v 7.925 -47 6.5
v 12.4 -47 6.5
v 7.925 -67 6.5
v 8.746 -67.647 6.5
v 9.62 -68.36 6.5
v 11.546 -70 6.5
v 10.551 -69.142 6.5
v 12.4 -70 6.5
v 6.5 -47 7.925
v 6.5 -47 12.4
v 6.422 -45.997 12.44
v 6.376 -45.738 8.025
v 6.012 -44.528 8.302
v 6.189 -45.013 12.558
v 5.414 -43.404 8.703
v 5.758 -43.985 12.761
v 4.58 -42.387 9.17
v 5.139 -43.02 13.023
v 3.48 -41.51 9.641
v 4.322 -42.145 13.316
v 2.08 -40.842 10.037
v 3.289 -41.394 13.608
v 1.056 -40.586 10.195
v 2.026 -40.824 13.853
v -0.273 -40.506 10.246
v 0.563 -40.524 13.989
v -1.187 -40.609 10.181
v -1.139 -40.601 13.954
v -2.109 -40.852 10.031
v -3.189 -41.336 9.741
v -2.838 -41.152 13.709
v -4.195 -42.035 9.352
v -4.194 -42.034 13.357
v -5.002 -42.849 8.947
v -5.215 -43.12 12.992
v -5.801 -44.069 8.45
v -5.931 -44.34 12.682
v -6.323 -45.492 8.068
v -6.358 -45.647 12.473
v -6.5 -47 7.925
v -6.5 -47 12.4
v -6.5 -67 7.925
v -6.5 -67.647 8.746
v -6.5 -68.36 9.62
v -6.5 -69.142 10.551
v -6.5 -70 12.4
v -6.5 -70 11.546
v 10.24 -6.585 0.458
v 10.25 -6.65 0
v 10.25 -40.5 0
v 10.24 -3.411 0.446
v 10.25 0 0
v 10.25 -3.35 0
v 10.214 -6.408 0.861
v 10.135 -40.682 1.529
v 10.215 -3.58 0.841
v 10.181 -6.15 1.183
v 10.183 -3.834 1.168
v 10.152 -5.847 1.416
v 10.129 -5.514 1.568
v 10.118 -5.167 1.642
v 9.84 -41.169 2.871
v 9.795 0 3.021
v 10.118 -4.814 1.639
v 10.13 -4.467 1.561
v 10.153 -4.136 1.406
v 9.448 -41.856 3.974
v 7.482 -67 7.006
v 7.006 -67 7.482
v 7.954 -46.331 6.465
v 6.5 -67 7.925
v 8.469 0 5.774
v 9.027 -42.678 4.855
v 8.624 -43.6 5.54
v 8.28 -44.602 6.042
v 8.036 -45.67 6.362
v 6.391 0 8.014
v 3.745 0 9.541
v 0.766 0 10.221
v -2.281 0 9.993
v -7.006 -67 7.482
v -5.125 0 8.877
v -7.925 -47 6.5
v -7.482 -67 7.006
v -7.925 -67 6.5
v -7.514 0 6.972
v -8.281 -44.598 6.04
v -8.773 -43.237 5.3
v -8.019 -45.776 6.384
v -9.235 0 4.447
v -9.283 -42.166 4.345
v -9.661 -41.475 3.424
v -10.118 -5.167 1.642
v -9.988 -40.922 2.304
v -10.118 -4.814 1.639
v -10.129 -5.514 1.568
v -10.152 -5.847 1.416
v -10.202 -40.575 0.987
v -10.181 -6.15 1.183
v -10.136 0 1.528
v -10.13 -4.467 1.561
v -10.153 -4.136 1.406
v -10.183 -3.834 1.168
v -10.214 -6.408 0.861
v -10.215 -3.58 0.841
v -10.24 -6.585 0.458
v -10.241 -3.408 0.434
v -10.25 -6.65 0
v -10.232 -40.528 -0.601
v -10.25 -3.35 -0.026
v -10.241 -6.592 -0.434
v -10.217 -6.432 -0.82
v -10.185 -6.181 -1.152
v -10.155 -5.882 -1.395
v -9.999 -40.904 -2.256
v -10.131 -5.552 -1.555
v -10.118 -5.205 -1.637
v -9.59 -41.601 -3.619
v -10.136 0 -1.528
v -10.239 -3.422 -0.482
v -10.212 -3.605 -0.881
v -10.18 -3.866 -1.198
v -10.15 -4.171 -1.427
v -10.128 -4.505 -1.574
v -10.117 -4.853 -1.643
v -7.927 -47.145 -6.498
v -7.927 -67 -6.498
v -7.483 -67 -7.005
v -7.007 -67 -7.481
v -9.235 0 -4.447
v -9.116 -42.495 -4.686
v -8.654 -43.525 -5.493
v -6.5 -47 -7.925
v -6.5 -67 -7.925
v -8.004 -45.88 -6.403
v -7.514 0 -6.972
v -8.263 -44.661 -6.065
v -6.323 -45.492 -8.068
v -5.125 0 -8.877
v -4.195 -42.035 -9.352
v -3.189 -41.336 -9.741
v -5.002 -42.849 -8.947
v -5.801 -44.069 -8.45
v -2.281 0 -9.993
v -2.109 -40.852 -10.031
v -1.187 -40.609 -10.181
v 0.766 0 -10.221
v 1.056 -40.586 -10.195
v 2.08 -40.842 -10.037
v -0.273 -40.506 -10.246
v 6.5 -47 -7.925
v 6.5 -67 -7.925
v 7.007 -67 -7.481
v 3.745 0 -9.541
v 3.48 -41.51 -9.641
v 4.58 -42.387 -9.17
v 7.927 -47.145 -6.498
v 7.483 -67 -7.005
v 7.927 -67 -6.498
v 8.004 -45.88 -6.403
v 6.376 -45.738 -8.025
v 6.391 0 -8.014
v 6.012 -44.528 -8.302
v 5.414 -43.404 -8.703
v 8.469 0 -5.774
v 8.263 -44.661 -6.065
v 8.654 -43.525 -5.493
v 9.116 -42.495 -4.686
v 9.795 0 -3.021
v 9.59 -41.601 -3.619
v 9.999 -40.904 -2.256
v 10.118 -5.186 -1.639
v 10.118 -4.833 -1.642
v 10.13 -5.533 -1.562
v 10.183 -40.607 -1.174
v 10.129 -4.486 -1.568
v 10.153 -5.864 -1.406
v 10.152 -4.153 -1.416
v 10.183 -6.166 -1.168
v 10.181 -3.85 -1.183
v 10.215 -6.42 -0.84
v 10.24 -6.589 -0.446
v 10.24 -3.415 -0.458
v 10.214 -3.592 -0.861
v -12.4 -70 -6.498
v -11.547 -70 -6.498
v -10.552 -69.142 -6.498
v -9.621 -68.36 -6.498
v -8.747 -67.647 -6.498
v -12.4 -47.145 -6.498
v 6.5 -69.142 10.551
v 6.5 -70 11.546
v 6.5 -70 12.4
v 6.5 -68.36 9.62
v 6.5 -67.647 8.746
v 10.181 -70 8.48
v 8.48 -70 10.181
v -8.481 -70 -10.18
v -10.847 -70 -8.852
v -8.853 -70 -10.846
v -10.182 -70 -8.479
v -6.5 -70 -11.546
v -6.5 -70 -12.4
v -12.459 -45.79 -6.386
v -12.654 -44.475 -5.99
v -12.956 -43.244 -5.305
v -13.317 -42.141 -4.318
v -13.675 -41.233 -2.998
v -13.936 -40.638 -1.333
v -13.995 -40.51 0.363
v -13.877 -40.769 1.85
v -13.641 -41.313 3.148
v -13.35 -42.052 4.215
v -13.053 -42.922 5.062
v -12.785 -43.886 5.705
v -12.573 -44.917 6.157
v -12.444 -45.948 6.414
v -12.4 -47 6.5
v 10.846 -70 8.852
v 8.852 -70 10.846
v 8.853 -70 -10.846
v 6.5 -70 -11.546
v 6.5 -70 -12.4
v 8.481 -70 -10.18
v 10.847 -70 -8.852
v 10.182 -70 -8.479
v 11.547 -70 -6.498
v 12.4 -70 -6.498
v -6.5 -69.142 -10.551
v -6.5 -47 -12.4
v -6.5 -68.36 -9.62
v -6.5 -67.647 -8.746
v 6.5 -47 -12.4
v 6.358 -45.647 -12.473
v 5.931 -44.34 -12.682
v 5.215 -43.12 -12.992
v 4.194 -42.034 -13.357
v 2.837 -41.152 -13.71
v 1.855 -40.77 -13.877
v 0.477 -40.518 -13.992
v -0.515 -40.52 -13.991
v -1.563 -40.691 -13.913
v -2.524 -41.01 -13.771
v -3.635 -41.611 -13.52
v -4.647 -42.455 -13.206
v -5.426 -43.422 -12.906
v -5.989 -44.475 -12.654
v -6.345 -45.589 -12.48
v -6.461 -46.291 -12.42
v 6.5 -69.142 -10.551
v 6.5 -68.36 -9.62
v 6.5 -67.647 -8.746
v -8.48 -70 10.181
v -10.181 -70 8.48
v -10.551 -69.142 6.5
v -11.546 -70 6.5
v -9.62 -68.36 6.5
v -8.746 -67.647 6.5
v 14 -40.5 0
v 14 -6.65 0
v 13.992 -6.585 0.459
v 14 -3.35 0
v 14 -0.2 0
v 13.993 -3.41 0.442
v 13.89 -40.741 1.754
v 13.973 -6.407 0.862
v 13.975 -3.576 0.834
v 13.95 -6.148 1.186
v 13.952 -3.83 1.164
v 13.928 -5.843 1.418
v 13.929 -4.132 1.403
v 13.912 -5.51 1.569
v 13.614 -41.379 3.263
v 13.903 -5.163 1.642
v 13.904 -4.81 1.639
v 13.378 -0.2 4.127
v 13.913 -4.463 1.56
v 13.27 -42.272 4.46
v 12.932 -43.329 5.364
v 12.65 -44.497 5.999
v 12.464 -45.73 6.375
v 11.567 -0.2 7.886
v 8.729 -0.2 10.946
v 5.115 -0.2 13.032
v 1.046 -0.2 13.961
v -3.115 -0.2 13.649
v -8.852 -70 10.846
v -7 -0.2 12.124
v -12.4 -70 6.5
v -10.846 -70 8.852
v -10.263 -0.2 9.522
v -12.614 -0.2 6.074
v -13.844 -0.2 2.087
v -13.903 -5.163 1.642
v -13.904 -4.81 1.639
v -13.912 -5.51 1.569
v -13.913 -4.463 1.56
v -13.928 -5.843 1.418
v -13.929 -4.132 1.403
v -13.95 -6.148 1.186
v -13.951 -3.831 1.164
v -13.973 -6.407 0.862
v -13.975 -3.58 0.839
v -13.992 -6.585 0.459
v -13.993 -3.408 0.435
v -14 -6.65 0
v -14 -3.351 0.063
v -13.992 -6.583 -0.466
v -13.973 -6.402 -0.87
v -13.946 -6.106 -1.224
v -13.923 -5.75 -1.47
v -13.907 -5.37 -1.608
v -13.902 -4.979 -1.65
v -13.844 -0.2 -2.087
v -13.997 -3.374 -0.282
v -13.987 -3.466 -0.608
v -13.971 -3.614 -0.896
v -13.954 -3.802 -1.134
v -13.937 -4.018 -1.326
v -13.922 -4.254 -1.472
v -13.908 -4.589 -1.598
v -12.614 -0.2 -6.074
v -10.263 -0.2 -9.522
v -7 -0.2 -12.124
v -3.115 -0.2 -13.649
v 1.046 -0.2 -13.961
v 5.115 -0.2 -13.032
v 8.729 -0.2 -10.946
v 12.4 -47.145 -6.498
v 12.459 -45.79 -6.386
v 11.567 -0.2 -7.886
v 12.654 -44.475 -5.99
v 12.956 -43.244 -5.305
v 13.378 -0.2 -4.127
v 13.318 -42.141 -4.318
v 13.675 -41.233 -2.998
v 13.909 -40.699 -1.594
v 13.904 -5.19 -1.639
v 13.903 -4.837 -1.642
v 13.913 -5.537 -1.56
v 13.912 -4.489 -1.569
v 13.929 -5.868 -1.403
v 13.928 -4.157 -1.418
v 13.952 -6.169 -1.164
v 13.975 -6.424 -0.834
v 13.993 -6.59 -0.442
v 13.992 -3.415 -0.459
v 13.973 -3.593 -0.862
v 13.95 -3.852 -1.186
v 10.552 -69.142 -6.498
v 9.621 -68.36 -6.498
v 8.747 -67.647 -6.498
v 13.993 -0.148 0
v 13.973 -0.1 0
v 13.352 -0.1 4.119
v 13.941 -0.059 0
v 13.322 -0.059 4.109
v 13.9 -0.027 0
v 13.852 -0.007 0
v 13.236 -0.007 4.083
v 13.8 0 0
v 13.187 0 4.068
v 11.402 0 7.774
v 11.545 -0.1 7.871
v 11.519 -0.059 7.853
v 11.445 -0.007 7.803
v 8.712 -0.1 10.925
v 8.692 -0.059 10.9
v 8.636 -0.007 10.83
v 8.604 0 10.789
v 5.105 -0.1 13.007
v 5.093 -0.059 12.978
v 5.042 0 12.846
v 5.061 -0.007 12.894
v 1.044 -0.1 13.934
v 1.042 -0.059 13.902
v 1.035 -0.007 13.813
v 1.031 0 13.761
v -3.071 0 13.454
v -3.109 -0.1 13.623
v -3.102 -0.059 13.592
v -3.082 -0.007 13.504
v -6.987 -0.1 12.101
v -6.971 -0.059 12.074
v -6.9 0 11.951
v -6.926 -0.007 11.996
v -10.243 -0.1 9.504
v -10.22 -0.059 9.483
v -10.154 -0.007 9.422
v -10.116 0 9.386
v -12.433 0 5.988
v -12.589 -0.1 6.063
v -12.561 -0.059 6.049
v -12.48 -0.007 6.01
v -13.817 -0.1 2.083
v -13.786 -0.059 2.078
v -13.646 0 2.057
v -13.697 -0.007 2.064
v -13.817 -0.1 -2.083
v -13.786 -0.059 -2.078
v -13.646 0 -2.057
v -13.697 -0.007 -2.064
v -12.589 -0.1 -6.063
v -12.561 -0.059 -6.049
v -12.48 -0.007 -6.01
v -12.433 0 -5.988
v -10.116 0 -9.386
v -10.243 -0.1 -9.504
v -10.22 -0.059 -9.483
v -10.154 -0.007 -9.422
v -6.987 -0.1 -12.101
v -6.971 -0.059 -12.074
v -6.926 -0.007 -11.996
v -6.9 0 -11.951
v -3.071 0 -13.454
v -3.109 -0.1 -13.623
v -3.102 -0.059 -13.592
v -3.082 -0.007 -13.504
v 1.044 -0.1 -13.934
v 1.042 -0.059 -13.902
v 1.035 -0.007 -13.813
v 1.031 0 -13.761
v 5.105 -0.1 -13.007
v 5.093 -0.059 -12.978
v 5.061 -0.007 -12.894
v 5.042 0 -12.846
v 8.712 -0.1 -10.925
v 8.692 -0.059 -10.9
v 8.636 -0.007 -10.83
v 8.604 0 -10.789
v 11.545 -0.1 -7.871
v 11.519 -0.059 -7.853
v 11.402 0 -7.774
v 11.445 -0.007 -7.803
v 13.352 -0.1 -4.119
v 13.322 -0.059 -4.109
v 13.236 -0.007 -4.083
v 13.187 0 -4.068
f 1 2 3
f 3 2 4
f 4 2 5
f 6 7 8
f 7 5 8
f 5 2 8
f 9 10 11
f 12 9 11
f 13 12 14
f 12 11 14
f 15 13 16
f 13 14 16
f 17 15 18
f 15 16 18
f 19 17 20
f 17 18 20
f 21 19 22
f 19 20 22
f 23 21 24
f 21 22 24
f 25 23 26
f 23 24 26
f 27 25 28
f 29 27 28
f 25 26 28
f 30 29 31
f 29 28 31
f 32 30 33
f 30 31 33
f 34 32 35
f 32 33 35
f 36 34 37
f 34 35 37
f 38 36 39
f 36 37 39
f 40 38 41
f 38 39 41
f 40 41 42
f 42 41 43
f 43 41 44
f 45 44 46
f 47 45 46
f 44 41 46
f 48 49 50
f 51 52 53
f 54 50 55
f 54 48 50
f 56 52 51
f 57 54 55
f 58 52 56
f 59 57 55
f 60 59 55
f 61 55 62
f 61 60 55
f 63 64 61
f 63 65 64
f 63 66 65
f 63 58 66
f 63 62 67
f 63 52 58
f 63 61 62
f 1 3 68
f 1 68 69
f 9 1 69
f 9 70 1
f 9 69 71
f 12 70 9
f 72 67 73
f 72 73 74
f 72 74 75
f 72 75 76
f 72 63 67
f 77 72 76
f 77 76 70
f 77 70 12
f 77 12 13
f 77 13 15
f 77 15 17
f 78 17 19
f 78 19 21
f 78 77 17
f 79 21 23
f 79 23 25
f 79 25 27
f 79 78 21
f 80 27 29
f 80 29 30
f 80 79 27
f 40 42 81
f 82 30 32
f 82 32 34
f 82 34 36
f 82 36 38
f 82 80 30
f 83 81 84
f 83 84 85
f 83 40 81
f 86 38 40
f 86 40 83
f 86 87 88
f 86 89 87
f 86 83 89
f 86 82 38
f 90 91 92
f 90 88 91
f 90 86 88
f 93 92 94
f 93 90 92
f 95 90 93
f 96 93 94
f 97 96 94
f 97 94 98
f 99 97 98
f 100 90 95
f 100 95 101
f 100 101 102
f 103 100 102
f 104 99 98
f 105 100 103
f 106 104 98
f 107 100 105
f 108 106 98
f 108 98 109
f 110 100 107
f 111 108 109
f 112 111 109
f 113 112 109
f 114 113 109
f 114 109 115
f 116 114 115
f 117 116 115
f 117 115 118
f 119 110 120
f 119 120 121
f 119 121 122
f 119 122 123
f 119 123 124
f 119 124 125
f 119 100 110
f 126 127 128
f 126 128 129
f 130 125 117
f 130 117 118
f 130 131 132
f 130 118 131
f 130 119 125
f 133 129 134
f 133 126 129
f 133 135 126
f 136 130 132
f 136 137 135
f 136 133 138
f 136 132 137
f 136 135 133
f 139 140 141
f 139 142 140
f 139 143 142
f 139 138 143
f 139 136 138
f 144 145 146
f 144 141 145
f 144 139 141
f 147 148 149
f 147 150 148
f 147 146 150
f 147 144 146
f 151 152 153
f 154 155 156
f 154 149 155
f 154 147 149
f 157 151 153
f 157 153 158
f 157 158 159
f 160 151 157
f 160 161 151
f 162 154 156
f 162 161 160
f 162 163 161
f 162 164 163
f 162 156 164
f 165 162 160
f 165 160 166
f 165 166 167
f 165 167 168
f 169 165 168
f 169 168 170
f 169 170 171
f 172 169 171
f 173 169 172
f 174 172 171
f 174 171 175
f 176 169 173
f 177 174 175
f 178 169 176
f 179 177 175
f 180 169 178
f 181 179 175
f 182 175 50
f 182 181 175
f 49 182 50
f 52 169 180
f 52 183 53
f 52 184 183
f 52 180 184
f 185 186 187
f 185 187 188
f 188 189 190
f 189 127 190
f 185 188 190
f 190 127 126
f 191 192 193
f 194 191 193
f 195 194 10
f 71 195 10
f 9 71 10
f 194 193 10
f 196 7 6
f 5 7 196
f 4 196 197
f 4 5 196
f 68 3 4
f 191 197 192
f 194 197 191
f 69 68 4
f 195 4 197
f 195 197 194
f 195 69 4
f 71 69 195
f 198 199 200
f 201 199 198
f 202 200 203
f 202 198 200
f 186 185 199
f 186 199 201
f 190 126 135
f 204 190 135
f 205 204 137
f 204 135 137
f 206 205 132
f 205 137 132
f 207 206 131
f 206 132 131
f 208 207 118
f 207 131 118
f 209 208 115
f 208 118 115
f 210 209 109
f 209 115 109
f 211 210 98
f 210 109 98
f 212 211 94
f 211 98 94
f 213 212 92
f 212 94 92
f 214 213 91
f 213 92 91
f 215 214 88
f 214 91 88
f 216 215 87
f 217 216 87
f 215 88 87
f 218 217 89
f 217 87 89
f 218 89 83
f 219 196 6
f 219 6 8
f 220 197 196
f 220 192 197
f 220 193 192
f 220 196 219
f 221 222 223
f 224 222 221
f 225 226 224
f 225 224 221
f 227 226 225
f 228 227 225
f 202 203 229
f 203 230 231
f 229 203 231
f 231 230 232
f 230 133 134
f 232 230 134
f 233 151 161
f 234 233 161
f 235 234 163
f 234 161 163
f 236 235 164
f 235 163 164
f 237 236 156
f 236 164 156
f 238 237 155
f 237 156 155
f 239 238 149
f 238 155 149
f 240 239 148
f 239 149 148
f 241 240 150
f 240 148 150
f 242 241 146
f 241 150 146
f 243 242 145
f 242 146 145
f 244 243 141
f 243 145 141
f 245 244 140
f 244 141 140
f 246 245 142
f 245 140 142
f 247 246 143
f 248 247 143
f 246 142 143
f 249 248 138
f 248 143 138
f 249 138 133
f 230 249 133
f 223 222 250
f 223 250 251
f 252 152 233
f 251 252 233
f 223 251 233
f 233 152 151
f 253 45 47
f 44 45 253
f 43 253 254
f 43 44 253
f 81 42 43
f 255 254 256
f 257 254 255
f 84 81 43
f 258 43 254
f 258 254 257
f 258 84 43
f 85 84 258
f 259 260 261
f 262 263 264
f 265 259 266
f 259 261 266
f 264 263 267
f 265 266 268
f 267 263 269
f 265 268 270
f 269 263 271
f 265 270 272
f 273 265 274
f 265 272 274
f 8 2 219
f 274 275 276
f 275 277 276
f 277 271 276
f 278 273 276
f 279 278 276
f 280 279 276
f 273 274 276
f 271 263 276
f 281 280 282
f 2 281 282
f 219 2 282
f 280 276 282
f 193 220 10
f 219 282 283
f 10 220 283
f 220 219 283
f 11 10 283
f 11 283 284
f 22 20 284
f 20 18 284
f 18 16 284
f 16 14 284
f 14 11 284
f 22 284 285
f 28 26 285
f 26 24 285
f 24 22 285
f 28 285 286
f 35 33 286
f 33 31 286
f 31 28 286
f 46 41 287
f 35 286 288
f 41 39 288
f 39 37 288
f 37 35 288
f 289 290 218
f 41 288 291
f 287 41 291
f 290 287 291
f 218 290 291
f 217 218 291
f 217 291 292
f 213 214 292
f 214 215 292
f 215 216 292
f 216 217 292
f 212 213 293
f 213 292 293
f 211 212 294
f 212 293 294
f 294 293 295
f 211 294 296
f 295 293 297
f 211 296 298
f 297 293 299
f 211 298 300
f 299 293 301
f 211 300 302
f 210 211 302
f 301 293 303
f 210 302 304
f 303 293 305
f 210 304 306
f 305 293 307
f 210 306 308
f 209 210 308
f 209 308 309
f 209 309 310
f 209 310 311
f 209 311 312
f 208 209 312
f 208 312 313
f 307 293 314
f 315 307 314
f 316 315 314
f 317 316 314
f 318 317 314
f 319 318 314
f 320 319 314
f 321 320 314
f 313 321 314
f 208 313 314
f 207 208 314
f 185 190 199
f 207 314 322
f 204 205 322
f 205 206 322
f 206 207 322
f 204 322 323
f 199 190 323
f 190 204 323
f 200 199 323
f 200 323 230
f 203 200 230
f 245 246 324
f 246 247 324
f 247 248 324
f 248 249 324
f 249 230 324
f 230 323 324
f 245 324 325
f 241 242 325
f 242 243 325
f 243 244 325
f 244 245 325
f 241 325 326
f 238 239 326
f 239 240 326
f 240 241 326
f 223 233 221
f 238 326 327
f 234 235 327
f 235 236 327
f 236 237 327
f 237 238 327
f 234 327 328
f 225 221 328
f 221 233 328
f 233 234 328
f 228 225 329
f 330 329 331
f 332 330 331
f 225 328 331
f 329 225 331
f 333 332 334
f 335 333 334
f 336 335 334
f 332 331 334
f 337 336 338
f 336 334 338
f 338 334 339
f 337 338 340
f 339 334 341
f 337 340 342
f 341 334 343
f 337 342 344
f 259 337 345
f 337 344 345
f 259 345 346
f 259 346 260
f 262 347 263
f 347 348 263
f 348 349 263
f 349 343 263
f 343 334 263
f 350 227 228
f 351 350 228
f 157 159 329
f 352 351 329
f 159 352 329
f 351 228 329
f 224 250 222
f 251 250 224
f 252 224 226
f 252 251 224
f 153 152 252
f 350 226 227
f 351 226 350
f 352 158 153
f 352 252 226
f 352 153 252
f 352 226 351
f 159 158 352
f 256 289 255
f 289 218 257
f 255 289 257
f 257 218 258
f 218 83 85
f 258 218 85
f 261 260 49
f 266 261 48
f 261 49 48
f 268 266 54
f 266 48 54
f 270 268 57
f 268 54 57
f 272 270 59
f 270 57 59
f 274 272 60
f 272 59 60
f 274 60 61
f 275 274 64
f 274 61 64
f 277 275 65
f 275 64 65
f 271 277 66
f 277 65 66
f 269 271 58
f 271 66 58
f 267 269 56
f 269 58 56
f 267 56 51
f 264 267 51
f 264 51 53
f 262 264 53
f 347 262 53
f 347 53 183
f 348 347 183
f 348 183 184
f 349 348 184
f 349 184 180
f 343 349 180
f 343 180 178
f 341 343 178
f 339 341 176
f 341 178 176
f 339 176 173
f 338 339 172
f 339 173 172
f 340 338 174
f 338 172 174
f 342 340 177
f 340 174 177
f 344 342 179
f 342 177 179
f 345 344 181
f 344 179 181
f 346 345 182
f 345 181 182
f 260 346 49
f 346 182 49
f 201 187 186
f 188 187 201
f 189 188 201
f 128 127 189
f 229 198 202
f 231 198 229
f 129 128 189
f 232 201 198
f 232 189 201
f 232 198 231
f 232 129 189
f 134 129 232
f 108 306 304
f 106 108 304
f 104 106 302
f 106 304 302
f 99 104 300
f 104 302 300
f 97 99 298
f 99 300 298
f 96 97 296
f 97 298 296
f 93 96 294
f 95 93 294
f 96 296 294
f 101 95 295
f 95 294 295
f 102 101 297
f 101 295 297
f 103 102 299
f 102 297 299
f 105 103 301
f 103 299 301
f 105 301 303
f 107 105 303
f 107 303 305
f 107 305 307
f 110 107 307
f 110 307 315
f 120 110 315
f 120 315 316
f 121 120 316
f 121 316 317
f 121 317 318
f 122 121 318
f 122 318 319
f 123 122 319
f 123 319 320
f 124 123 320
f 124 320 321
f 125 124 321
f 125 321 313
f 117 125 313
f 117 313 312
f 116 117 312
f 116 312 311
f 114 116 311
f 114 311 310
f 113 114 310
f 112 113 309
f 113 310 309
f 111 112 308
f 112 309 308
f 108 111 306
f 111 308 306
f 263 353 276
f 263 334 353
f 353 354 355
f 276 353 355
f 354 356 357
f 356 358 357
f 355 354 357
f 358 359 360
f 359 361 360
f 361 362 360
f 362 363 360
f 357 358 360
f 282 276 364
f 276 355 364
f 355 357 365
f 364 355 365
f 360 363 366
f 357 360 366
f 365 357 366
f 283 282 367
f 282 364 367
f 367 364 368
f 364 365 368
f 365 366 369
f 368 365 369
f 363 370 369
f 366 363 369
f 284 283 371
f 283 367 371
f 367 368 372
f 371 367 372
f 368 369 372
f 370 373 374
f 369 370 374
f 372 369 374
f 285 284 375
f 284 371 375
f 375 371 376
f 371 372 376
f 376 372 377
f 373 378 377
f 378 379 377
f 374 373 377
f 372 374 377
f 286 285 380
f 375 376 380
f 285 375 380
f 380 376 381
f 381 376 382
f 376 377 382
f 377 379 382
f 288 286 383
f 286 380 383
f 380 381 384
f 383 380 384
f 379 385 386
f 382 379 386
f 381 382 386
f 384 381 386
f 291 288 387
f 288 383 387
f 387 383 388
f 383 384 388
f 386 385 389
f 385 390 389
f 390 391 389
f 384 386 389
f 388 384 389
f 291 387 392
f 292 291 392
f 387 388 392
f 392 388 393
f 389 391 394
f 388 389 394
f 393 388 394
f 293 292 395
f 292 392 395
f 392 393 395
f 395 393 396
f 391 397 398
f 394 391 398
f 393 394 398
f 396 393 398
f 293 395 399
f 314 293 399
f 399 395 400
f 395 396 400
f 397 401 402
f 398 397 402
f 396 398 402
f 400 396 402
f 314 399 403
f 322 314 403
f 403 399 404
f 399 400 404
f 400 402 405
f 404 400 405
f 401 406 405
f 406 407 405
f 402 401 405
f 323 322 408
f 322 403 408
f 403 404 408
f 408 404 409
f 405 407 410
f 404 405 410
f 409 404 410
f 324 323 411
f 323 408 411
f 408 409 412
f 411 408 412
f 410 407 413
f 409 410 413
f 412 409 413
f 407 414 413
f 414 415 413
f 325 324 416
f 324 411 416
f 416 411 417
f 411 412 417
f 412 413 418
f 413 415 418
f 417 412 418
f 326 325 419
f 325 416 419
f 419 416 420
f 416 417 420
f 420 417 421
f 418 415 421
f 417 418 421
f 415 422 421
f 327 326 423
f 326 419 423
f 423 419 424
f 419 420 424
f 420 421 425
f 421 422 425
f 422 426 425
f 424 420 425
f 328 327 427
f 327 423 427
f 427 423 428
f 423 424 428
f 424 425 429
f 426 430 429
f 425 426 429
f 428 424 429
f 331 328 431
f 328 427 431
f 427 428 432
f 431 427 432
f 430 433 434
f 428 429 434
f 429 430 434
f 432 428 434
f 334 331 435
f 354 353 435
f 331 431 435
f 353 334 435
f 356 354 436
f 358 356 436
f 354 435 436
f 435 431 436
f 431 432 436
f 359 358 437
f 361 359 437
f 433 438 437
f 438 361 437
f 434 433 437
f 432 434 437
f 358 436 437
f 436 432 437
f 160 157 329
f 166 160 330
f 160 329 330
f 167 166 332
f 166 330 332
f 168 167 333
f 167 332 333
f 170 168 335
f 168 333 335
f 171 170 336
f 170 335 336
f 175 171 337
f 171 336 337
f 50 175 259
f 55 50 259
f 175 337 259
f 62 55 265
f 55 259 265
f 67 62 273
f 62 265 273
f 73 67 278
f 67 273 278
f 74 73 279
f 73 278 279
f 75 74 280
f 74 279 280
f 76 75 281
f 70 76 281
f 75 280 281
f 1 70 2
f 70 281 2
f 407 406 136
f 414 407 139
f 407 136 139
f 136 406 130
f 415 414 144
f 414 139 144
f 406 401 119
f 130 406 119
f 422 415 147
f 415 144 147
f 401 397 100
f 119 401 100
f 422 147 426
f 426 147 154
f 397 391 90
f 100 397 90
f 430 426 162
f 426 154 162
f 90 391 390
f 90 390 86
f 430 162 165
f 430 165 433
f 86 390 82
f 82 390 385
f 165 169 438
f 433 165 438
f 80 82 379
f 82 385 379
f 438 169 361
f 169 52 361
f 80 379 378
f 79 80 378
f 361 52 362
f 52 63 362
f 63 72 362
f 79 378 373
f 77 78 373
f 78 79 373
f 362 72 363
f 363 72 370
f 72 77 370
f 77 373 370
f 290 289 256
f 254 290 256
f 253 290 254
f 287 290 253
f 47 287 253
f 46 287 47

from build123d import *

# Parameters (mm, degrees)
F0_R      = 14
F0_R_2    = 10.25
F1_DEPTH  = 70
F4_DEPTH  = 40
F5_SIZE   = 3
F6_D      = 3.3
F7_R      = 0.2
F10_DEPTH = 40


with BuildPart() as f1:
    # F0 (on Front) → F1 (new body)
    with BuildSketch(Plane.XZ):
        Circle(F0_R)
        Circle(F0_R_2, mode=Mode.SUBTRACT)
    extrude(amount=F1_DEPTH)

    # F3 (on offset) → F4 (cut)
    with BuildSketch(Plane.YZ.offset(14)):
        with BuildLine():
            Line((-70.0558224349, -6.4983871577), (-47.1447907046, -6.4983871577))
            ThreePointArc((-47.1447907046, -6.4983871577), (-40.5004032231, -0.0723998436), (-47, 6.5))
            Line((-47, 6.5), (-70.0558218767, 6.5))
            Line((-70.0558218767, 6.5), (-70.0558224349, -6.4983871577))
        make_face()
    extrude(amount=-F4_DEPTH, mode=Mode.SUBTRACT)

    # F5
    f5_edges = [f1.edges().sort_by_distance(p)[0] for p in [
        (0, -70, 10.25),
        (0, -70, -10.25),
    ]]
    chamfer(f5_edges, length=F5_SIZE)

    # F6 (through all)
    with Locations(Plane.YZ.offset(14)):
        with Locations((-5, 0)):
            Hole(F6_D / 2)

    # F7
    f7_edges = [f1.edges().sort_by_distance(p)[0] for p in [
        (-14, 0, 0),
    ]]
    fillet(f7_edges, radius=F7_R)

    # F9 (on offset) → F10 (cut)
    with BuildSketch(Plane.XY.offset(14)):
        with BuildLine():
            Line((6.5, -70.223480463), (6.5, -47))
            ThreePointArc((6.5, -47), (0, -40.5), (-6.5, -47))
            Line((-6.5, -47), (-6.5, -70.1674371958))
            Line((-6.5, -70.1674371958), (6.5, -70.223480463))
        make_face()
    extrude(amount=-F10_DEPTH, mode=Mode.SUBTRACT)


solid = f1.part
